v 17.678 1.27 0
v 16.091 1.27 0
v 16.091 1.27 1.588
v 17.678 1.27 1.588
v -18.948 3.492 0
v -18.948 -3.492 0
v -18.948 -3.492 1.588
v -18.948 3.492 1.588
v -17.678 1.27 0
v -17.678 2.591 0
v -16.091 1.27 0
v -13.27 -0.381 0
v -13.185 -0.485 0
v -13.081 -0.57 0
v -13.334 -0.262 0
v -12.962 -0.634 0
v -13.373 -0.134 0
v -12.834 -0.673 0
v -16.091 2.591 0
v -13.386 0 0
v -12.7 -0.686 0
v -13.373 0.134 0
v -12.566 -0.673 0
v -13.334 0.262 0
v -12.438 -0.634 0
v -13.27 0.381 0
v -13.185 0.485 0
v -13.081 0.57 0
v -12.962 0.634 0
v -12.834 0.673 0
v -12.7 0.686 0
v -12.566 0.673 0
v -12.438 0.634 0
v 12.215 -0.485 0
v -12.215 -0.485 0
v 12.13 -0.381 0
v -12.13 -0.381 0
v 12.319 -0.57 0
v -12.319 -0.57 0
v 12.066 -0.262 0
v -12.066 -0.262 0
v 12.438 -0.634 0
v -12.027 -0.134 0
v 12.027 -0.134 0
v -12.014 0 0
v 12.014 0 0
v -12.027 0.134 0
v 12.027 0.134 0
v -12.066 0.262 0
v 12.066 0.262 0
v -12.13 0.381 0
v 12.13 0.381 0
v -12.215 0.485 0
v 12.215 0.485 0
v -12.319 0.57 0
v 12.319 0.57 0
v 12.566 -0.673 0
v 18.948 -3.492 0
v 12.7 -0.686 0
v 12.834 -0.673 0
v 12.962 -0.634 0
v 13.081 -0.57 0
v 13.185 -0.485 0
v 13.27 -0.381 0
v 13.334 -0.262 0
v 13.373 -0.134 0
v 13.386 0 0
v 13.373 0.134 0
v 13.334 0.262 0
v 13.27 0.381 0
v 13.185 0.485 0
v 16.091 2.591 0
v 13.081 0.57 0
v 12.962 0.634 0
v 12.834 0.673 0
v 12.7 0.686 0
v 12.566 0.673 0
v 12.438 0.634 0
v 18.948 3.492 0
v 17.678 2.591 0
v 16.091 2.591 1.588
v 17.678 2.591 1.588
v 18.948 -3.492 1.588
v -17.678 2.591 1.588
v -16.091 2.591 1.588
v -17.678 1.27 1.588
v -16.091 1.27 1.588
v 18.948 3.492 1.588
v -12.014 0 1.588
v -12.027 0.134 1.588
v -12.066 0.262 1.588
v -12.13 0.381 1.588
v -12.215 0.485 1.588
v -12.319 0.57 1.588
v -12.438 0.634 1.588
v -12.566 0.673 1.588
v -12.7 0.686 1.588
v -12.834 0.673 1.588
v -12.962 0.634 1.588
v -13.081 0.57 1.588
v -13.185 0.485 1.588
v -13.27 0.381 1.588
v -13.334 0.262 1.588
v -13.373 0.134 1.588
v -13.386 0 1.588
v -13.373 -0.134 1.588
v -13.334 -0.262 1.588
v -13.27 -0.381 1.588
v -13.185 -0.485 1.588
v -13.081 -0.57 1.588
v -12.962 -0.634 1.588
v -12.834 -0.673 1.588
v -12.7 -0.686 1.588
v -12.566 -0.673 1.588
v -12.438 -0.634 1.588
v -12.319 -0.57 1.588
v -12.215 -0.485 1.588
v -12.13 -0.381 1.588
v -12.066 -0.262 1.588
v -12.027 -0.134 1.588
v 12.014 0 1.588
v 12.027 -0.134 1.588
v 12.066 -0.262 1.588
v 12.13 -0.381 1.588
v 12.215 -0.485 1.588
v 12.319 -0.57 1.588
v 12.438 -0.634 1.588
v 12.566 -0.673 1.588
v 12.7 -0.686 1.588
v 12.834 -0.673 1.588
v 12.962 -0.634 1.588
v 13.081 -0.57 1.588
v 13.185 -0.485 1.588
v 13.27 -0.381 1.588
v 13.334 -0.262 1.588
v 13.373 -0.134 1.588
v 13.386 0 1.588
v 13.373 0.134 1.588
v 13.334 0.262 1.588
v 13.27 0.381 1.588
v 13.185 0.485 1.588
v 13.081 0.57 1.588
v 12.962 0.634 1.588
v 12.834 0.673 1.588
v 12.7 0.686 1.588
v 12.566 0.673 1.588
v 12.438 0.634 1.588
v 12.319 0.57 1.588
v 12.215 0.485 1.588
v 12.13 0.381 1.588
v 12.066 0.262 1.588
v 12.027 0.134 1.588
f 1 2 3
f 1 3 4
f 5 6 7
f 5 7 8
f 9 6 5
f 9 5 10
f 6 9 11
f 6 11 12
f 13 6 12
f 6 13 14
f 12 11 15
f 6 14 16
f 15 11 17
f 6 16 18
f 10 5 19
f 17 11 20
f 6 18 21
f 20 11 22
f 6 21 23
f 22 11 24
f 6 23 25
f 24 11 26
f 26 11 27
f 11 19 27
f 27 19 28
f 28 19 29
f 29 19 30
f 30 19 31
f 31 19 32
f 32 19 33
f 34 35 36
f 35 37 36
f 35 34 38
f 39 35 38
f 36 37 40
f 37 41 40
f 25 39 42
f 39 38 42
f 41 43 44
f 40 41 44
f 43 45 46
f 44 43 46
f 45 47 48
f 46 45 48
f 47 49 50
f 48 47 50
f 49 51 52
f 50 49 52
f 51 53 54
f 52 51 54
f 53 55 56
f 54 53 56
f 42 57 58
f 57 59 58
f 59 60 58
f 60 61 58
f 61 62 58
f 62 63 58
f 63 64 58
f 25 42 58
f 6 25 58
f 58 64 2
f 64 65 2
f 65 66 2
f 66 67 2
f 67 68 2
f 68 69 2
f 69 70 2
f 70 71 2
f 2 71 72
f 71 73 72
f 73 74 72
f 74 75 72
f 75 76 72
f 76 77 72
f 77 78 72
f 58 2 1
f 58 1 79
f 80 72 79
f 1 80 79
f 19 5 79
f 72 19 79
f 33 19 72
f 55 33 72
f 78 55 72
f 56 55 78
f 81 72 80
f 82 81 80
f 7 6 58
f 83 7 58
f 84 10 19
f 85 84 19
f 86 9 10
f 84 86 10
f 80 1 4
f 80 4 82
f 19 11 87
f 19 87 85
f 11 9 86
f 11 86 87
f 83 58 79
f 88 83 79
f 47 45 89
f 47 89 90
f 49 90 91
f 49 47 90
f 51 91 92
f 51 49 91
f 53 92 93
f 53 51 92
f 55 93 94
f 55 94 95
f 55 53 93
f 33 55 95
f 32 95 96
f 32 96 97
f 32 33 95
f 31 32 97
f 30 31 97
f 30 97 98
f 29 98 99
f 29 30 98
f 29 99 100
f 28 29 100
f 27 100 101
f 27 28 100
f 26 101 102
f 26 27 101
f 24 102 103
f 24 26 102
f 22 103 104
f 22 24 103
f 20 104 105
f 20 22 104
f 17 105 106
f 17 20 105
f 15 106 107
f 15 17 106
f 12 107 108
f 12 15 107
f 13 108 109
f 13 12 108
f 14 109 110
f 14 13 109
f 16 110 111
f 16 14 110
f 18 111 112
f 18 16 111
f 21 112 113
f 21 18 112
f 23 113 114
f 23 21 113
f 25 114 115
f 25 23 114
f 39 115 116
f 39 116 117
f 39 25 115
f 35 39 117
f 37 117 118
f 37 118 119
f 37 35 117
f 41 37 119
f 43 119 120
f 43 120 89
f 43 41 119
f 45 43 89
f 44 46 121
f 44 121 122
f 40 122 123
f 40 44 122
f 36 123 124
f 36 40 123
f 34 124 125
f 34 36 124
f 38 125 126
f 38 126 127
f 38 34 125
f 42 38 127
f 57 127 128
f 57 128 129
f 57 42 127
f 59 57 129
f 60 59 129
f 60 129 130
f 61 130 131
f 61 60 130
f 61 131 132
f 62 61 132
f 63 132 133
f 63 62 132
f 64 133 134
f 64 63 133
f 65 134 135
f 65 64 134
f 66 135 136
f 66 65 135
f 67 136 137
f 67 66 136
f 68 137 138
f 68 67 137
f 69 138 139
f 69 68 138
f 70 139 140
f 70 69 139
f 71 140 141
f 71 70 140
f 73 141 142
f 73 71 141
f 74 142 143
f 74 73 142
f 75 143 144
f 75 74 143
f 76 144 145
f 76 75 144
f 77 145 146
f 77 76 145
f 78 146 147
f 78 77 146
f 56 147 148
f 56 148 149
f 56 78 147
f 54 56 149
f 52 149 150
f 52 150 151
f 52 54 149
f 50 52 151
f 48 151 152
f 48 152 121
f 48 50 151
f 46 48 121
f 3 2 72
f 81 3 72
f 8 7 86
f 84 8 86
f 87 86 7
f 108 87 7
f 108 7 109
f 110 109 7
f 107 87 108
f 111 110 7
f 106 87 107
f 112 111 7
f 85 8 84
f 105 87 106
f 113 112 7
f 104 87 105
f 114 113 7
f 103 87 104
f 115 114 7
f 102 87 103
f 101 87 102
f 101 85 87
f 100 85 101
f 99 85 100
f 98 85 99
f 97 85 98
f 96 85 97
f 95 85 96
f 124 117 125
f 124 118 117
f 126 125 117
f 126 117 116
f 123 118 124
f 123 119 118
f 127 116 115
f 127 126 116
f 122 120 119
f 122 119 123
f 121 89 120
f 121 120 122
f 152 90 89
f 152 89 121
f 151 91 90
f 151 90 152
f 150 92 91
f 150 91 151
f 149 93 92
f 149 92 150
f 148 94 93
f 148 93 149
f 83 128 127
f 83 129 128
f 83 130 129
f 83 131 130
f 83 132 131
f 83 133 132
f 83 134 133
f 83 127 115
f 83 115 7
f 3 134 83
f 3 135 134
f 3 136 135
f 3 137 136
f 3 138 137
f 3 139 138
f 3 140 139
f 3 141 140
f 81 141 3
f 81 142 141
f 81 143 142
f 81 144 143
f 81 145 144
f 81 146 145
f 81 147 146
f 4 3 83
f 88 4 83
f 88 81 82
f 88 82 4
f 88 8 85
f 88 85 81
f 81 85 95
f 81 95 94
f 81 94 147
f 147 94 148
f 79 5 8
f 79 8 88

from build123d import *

# Parameters (mm, degrees)
SKETCH1_W           = 37.8968
SKETCH1_H           = 6.985
SKETCH1_R           = 0.6858
SKETCH1_W_2         = 1.5875
SKETCH1_H_2         = 1.3208
BOSS_EXTRUDE1_DEPTH = 1.5875


with BuildPart() as part:
    # Sketch1 → Boss-Extrude1 (new body)
    with BuildSketch(Plane.XY):
        Rectangle(SKETCH1_W, SKETCH1_H)
        with Locations((-12.7, 0)):
            Circle(SKETCH1_R, mode=Mode.SUBTRACT)
        with Locations(Location((12.7, 0, 0), (0, 0, 180))):
            Circle(SKETCH1_R, mode=Mode.SUBTRACT)
        with Locations((-16.88465, 1.9304)):
            Rectangle(SKETCH1_W_2, SKETCH1_H_2, mode=Mode.SUBTRACT)
        with Locations((16.88465, 1.9304)):
            Rectangle(SKETCH1_W_2, SKETCH1_H_2, mode=Mode.SUBTRACT)
    extrude(amount=BOSS_EXTRUDE1_DEPTH)


solid = part.part
